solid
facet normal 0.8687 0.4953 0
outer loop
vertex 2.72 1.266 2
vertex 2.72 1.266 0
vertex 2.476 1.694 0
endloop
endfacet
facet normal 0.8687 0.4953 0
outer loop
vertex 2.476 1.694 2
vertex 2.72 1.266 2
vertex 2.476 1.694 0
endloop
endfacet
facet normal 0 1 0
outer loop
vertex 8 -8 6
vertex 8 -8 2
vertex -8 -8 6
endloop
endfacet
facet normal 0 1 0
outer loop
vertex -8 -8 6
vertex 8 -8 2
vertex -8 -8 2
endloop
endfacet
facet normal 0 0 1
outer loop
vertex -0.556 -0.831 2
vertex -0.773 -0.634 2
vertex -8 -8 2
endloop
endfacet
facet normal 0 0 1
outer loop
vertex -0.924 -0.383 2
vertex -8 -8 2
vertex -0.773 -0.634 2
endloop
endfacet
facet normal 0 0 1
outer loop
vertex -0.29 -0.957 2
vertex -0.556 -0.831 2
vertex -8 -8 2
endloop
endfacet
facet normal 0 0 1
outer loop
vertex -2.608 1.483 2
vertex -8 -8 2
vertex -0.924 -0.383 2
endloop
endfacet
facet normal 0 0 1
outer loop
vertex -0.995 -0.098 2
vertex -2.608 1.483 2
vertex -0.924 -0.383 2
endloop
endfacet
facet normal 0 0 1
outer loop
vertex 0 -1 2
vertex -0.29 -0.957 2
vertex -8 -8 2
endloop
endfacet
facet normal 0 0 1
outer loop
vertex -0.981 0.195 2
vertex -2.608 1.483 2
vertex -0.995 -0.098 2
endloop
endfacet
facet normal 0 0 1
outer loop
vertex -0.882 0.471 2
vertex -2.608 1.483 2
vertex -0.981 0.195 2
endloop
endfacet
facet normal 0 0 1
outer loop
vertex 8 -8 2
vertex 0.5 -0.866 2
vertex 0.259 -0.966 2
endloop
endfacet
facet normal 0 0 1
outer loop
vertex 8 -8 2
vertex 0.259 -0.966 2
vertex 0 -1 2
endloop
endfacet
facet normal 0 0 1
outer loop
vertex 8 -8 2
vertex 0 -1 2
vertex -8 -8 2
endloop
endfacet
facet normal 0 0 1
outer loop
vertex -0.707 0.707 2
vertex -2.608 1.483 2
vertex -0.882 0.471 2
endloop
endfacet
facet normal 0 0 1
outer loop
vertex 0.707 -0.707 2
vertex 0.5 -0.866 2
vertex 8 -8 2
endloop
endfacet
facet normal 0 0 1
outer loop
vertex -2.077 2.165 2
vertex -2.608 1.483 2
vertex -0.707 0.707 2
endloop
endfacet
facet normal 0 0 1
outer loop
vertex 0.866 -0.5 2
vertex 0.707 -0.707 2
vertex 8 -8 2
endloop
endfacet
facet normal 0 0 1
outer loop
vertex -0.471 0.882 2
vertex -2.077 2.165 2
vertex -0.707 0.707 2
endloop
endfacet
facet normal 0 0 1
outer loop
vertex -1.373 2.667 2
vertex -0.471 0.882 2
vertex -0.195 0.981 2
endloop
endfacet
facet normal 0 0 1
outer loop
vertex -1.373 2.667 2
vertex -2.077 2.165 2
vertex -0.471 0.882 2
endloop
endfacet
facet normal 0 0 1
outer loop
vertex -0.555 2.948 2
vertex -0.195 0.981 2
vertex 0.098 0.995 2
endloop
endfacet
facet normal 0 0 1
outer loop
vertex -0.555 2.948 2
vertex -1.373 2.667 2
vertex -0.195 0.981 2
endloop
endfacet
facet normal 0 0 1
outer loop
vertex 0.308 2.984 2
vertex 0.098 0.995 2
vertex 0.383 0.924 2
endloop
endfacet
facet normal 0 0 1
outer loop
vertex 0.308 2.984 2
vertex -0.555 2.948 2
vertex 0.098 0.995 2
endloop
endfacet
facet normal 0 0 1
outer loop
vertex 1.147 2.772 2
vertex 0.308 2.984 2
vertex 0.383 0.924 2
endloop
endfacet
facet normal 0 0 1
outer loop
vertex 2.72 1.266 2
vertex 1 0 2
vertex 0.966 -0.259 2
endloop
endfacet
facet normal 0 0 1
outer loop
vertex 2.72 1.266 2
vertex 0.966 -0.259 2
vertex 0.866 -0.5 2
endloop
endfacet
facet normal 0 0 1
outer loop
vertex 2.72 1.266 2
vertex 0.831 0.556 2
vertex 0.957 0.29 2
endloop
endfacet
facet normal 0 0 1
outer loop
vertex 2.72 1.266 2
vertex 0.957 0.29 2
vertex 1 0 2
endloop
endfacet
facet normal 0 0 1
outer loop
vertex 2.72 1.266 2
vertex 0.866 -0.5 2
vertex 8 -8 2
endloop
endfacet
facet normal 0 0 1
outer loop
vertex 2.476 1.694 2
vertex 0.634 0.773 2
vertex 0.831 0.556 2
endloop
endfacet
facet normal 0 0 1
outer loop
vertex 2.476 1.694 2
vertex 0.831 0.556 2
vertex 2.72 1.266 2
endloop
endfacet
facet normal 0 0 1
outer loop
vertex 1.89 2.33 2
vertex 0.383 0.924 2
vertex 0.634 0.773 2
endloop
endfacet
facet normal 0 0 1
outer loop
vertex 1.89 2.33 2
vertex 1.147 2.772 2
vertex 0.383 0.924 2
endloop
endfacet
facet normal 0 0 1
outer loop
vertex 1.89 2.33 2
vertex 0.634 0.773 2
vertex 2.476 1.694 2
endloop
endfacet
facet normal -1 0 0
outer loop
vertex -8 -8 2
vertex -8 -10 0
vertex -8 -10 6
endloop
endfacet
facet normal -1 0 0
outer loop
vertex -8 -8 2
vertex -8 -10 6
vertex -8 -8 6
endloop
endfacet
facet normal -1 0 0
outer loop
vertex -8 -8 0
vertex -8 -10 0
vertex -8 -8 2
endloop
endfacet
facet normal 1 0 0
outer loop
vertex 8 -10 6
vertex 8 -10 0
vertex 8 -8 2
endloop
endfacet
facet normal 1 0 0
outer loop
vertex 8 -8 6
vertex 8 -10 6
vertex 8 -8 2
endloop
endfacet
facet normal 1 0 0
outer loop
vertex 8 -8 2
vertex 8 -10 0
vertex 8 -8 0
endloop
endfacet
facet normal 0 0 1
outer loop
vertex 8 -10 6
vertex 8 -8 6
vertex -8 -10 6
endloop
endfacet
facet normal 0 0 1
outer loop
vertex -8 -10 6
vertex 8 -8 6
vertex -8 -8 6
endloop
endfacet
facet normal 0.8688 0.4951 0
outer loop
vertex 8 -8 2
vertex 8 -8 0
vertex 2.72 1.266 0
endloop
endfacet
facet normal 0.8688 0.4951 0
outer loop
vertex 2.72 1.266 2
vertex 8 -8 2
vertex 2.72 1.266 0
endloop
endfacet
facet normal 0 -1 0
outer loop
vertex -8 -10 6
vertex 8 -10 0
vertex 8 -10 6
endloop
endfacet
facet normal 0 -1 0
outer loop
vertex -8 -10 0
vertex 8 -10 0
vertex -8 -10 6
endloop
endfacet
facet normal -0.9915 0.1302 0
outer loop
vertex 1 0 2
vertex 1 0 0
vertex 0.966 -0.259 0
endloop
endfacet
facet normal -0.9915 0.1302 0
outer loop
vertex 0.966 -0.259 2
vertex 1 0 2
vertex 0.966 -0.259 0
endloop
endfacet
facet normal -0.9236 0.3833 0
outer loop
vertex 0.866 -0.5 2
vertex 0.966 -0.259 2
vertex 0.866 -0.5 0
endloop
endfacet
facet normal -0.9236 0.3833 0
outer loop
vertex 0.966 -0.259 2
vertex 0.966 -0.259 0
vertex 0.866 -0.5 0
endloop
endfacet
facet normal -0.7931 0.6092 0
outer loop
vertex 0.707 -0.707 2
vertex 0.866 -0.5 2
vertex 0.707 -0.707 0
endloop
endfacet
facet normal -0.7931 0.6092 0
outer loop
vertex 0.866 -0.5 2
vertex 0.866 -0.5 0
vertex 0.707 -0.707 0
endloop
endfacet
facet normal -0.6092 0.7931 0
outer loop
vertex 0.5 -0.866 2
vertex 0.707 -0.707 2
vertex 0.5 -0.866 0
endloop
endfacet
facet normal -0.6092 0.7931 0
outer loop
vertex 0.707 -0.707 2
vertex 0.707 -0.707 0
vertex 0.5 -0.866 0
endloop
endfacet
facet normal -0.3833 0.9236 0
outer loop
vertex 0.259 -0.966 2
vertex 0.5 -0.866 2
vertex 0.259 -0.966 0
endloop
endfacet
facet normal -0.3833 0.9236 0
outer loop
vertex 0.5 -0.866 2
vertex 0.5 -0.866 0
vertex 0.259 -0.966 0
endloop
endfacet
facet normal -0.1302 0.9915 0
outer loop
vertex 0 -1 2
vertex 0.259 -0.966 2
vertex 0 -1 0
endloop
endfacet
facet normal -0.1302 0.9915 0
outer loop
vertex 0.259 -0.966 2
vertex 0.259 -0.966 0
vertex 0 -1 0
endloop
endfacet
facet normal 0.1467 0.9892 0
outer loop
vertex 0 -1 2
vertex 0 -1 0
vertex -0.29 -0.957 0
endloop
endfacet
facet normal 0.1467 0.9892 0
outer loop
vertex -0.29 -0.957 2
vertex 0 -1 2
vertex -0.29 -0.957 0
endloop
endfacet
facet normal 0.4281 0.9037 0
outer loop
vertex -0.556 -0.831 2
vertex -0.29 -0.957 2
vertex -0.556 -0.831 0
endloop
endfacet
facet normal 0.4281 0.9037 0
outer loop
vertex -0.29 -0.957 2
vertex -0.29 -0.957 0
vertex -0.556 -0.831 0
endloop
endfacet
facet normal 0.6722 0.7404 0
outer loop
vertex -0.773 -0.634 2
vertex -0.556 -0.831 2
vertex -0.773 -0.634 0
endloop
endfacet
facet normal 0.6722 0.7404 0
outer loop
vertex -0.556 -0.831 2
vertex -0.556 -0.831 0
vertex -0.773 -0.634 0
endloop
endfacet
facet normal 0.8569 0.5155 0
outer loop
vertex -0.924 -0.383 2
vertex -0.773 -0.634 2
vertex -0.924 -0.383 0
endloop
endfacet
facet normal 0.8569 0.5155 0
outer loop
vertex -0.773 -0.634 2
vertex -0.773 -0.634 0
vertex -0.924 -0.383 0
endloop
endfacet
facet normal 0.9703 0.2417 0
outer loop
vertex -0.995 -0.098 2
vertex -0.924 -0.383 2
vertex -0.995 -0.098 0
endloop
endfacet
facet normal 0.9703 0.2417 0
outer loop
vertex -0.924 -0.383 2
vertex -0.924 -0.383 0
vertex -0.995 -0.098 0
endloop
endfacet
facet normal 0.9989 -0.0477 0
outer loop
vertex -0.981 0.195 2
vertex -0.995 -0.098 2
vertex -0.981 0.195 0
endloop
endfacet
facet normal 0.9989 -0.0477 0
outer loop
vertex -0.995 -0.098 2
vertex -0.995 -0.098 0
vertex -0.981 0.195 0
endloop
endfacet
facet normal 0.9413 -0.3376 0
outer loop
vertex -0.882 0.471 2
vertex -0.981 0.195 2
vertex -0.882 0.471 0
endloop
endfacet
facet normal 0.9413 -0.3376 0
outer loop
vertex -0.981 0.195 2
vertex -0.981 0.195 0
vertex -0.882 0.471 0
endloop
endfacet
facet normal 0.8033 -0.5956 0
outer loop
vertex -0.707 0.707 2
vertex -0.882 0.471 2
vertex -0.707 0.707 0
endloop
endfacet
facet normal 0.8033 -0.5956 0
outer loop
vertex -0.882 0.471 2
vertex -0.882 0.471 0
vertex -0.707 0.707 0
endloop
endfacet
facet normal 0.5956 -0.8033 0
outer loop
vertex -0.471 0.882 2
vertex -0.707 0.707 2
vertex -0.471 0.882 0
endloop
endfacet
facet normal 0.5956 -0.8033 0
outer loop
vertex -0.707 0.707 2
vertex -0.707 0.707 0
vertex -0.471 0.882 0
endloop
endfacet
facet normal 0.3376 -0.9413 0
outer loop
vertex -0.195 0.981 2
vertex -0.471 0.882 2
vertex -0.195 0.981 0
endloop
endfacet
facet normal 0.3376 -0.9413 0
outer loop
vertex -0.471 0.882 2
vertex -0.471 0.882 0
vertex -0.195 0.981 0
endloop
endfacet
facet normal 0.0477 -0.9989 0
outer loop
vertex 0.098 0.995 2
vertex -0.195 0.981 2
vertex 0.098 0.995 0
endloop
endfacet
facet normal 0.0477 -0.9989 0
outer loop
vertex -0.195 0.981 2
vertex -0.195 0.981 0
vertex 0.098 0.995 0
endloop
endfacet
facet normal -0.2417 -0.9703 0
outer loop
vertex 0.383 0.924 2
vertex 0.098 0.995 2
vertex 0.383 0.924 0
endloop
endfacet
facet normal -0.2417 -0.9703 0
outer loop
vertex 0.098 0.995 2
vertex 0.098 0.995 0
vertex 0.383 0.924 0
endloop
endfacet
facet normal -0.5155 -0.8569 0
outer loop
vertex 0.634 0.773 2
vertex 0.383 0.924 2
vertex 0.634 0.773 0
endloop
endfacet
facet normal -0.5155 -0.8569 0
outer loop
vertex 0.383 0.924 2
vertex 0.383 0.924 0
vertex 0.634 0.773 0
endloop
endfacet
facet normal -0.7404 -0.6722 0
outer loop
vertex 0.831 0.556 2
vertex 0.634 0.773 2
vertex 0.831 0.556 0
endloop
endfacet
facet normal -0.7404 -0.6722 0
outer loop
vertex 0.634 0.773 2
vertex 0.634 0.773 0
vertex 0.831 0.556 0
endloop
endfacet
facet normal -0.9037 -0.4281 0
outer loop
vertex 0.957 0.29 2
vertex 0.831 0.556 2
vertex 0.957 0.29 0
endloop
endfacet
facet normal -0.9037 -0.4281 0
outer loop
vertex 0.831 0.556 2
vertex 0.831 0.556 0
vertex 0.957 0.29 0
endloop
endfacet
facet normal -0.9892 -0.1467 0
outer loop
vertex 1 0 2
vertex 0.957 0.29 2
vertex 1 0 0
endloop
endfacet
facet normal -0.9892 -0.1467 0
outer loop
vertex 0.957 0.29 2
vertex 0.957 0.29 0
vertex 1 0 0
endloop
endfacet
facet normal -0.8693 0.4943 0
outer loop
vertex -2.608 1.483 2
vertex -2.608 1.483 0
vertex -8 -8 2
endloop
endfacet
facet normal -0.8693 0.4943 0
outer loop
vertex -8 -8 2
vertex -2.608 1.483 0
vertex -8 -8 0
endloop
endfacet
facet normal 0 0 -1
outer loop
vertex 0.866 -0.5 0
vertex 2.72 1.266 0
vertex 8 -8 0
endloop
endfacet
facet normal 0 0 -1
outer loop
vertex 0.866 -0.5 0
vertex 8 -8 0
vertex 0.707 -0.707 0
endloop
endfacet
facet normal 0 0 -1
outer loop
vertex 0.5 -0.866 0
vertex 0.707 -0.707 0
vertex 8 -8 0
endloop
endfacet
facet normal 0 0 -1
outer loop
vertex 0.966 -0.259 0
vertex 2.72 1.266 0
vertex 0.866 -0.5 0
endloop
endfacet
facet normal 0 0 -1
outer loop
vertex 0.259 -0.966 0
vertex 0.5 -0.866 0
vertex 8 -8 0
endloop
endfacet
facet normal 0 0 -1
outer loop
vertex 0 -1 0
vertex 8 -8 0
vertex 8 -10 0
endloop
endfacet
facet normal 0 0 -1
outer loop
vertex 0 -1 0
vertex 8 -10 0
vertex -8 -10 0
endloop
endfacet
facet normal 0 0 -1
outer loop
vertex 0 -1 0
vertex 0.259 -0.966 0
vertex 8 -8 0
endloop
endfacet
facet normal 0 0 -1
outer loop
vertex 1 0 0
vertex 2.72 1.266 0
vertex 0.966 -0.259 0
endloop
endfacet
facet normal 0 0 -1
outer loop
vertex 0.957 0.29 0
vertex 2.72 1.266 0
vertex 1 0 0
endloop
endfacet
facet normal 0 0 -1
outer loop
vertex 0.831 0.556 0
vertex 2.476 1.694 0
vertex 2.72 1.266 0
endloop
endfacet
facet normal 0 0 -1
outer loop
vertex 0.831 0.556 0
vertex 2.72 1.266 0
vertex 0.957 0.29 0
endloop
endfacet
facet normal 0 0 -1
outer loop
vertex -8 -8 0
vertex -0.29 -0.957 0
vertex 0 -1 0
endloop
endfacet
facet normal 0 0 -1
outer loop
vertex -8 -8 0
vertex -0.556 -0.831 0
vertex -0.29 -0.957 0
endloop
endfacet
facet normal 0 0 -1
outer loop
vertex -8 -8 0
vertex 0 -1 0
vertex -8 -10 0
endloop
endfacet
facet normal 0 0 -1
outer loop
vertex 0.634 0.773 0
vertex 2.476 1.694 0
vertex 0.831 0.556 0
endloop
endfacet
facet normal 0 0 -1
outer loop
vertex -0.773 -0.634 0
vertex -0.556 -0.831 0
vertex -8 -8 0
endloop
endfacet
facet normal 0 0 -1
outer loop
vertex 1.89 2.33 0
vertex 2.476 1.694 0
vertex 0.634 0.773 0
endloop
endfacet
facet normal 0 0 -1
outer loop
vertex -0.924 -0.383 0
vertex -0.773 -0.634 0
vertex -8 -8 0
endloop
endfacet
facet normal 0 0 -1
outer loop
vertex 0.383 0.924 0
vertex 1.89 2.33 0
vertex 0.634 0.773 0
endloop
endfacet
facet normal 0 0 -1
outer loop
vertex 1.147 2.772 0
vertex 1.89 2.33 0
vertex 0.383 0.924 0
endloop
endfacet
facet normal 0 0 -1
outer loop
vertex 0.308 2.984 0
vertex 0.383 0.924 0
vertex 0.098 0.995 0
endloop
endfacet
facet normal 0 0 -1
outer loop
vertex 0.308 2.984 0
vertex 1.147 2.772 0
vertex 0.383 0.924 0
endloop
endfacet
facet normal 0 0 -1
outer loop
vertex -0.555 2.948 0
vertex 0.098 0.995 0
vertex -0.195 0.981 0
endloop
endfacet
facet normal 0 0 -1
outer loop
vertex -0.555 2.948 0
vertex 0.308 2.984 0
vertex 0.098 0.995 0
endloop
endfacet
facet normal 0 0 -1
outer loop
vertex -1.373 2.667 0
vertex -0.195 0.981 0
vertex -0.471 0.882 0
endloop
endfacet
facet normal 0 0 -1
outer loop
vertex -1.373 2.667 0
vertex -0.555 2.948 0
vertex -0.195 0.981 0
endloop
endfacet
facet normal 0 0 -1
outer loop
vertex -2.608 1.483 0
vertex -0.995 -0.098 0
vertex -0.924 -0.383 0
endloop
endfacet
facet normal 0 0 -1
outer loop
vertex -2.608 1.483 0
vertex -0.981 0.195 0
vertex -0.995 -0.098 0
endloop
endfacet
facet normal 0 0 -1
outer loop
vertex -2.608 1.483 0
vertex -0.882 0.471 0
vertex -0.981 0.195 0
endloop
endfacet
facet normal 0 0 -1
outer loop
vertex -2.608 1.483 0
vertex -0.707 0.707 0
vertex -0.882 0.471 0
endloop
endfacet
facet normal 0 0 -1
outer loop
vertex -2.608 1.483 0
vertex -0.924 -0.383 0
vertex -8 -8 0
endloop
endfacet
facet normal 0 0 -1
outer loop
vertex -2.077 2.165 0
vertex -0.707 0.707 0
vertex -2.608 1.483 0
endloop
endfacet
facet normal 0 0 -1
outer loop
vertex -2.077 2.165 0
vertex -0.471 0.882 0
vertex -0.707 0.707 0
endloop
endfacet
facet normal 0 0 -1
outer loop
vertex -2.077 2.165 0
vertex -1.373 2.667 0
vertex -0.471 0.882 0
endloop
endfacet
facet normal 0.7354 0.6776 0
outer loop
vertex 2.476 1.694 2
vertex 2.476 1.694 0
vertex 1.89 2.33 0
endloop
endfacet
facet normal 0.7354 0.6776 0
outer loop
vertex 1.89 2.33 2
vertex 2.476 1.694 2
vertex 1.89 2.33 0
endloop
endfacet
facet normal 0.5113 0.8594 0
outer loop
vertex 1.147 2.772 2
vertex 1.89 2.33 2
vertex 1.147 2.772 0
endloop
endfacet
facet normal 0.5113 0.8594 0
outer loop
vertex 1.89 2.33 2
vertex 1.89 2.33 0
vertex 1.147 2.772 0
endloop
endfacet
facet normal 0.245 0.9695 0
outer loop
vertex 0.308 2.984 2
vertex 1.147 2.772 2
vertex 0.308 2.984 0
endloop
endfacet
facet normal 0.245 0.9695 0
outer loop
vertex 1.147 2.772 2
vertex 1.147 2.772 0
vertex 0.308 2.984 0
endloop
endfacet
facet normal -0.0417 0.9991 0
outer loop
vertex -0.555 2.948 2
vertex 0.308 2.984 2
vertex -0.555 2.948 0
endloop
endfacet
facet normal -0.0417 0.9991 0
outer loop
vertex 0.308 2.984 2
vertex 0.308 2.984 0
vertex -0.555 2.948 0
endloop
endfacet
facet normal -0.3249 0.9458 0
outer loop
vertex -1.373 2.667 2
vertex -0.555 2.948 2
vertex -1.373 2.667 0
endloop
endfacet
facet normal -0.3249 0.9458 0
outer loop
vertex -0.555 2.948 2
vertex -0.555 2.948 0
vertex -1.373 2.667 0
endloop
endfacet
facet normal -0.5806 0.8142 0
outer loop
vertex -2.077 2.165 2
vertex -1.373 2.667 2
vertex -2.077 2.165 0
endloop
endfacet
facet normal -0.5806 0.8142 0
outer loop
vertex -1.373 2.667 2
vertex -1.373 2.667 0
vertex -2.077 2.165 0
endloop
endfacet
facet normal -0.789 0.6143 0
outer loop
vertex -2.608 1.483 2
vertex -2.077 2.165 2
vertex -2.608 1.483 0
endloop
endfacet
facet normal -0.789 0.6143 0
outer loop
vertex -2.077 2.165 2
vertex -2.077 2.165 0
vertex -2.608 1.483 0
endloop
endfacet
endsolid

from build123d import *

# Parameters (mm, degrees)
EXTRUDE_1_DEPTH = 2
SKETCH_2_W      = 16
SKETCH_2_H      = 2
EXTRUDE_2_DEPTH = 6


with BuildPart() as part:
    # 草图1 → 凸台-拉伸1 (new body)
    with BuildSketch(Plane.XY):
        with BuildLine():
            Line((-8, -8), (0, -8))
            Line((0, -8), (8, -8))
            Line((8, -8), (2.719740406, 1.26610115))
            Line((2.719740406, 1.26610115), (2.475636513, 1.694468606))
            ThreePointArc((2.475636513, 1.694468606), (-0.124757283, 2.997404814), (-2.607883521, 1.482883521))
            Line((-2.607883521, 1.482883521), (-8, -8))
        make_face()
        with BuildLine():
            ThreePointArc((0, -1), (-0.707106781, 0.707106781), (1, 0))
            ThreePointArc((1, 0), (0.707106781, -0.707106781), (0, -1))
        make_face(mode=Mode.SUBTRACT)
    extrude(amount=EXTRUDE_1_DEPTH)

    # 草图2 → 凸台-拉伸2 (add)
    with BuildSketch(Plane(origin=(0, 0, 0), x_dir=(-1, 0, 0), z_dir=(0, 0, -1))):
        with Locations((0, -9)):
            Rectangle(SKETCH_2_W, SKETCH_2_H)
    extrude(amount=-EXTRUDE_2_DEPTH)


solid = part.part
